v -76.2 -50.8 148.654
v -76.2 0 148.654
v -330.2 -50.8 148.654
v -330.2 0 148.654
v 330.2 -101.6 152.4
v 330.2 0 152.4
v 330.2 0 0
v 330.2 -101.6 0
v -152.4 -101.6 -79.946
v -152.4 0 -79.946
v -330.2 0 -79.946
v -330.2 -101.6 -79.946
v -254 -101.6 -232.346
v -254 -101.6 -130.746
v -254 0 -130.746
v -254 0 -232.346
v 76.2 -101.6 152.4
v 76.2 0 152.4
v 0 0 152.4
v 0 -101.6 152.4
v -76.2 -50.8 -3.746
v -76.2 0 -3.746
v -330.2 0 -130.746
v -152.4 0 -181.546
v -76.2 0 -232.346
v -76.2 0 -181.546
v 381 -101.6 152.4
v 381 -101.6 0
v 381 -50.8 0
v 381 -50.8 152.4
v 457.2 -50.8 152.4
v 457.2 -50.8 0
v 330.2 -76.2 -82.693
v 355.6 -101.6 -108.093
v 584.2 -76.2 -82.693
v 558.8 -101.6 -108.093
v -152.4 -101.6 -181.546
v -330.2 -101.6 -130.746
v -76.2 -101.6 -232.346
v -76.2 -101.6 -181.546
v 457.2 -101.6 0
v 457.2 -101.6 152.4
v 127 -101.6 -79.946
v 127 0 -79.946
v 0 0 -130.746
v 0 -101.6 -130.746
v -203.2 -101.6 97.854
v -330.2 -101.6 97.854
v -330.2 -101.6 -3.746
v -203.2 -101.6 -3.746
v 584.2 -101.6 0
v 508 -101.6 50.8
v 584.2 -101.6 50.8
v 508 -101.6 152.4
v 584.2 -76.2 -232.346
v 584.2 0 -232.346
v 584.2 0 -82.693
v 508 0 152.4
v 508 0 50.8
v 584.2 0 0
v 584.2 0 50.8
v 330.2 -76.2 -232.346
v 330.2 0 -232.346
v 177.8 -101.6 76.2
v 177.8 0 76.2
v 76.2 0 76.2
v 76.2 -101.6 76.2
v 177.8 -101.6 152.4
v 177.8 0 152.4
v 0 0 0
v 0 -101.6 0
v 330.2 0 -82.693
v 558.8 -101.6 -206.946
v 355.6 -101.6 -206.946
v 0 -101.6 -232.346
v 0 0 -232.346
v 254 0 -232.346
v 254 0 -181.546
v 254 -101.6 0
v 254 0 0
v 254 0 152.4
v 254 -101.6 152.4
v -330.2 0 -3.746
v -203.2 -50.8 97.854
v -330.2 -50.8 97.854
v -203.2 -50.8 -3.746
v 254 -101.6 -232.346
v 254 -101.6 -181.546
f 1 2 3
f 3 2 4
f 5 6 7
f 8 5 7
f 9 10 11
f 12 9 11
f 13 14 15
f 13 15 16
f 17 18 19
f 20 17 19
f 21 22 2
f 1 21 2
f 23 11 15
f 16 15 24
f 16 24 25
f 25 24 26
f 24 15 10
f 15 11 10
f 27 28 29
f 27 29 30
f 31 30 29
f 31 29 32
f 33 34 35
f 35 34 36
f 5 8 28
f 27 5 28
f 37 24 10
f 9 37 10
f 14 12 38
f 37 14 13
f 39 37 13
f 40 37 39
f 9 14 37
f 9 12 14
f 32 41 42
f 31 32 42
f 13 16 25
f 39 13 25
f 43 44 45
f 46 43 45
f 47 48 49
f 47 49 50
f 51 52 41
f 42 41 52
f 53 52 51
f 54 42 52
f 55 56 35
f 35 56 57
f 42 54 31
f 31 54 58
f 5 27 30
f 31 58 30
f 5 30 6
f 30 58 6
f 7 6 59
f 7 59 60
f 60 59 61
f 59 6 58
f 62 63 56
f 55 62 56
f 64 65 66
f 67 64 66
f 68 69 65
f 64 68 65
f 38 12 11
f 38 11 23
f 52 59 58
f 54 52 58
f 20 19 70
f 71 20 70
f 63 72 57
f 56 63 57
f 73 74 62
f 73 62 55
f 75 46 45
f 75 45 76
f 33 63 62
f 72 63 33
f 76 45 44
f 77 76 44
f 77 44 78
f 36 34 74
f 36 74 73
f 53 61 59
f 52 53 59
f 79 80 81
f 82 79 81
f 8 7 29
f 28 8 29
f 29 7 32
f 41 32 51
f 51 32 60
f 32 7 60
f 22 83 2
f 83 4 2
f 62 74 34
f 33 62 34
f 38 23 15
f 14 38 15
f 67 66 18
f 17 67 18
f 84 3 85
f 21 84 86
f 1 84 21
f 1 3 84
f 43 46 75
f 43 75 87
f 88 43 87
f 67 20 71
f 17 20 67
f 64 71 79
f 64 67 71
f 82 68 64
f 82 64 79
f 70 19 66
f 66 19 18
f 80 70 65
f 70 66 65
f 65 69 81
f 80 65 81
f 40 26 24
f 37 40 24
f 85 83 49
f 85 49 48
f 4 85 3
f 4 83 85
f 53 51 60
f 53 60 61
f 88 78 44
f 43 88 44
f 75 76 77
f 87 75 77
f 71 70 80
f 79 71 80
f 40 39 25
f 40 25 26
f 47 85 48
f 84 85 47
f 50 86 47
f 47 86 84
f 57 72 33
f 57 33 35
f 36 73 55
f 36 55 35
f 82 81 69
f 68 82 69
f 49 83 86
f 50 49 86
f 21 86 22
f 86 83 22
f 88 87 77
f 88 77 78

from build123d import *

# Parameters (mm, degrees)
F1_DEPTH = 101.6
F2_DEPTH = 50.8
F0_W     = 127
F0_H     = 101.6
F3_DEPTH = 101.6
F4_DEPTH = 101.6
F5_W     = 76.2
F5_H     = 152.4
F6_DEPTH = 50.8
F7_DEPTH = 101.6
F8_DEPTH = 101.6
F0_W_2   = 254
F0_H_2   = 149.6527589202
F9_DEPTH = 101.6
F10_SIZE = 25.4


with BuildPart() as f1:
    # F0 (on Front) → F1 (new body)
    with BuildSketch(Plane.XZ):
        Polygon((0, 152.4), (0, 0), (254, 0), (254, 152.4), (177.8, 152.4), (177.8, 76.2), (76.2, 76.2), (76.2, 152.4), align=None)
    extrude(amount=F1_DEPTH)


with BuildPart() as f2:
    # F0 (on Front) → F2 (new body)
    with BuildSketch(Plane.XZ):
        Polygon((-203.2, -3.7458194733), (-76.2, -3.7458194733), (-76.2, 148.6541805267), (-330.2, 148.6541805267), (-330.2, 97.8541805267), (-203.2, 97.8541805267), align=None)
    extrude(amount=F2_DEPTH)

    # F0 (on Front) → F3 (join)
    with BuildSketch(Plane.XZ):
        with Locations((-266.7, 47.0541805267)):
            Rectangle(F0_W, F0_H)
    extrude(amount=F3_DEPTH)


with BuildPart() as f4:
    # F0 (on Front) → F4 (new body)
    with BuildSketch(Plane.XZ):
        Polygon((508, 152.4), (330.2, 152.4), (330.2, 0), (584.2, 0), (584.2, 50.8), (508, 50.8), align=None)
    extrude(amount=F4_DEPTH)

    # F5 (on face) → F6 (cut)
    with BuildSketch(Plane.XZ.offset(101.6)):
        with Locations((419.1, 76.2)):
            Rectangle(F5_W, F5_H)
    extrude(amount=-F6_DEPTH, mode=Mode.SUBTRACT)


with BuildPart() as f7:
    # F0 (on Front) → F7 (new body)
    with BuildSketch(Plane.XZ):
        Polygon((-152.4, -79.9458194733), (-330.2, -79.9458194733), (-330.2, -130.7458194733), (-254, -130.7458194733), (-254, -232.3458194733), (-76.2, -232.3458194733), (-76.2, -181.5458194733), (-152.4, -181.5458194733), align=None)
    extrude(amount=F7_DEPTH)


with BuildPart() as f8:
    # F0 (on Front) → F8 (new body)
    with BuildSketch(Plane.XZ):
        Polygon((254, -181.5458194733), (127, -79.9458194733), (0, -130.7458194733), (0, -232.3458194733), (254, -232.3458194733), align=None)
    extrude(amount=F8_DEPTH)


with BuildPart() as f9:
    # F0 (on Front) → F9 (new body)
    with BuildSketch(Plane.XZ):
        with Locations((457.2, -157.5194400132)):
            Rectangle(F0_W_2, F0_H_2)
    extrude(amount=F9_DEPTH)

    # F10
    f10_edges = [f9.edges().sort_by_distance(p)[0] for p in [
        (330.2, -101.6, -157.51944),
        (457.2, -101.6, -232.345819),
        (584.2, -101.6, -157.51944),
        (457.2, -101.6, -82.693061),
    ]]
    chamfer(f10_edges, length=F10_SIZE)


solid = Compound([f1.part, f2.part, f4.part, f7.part, f8.part, f9.part])
